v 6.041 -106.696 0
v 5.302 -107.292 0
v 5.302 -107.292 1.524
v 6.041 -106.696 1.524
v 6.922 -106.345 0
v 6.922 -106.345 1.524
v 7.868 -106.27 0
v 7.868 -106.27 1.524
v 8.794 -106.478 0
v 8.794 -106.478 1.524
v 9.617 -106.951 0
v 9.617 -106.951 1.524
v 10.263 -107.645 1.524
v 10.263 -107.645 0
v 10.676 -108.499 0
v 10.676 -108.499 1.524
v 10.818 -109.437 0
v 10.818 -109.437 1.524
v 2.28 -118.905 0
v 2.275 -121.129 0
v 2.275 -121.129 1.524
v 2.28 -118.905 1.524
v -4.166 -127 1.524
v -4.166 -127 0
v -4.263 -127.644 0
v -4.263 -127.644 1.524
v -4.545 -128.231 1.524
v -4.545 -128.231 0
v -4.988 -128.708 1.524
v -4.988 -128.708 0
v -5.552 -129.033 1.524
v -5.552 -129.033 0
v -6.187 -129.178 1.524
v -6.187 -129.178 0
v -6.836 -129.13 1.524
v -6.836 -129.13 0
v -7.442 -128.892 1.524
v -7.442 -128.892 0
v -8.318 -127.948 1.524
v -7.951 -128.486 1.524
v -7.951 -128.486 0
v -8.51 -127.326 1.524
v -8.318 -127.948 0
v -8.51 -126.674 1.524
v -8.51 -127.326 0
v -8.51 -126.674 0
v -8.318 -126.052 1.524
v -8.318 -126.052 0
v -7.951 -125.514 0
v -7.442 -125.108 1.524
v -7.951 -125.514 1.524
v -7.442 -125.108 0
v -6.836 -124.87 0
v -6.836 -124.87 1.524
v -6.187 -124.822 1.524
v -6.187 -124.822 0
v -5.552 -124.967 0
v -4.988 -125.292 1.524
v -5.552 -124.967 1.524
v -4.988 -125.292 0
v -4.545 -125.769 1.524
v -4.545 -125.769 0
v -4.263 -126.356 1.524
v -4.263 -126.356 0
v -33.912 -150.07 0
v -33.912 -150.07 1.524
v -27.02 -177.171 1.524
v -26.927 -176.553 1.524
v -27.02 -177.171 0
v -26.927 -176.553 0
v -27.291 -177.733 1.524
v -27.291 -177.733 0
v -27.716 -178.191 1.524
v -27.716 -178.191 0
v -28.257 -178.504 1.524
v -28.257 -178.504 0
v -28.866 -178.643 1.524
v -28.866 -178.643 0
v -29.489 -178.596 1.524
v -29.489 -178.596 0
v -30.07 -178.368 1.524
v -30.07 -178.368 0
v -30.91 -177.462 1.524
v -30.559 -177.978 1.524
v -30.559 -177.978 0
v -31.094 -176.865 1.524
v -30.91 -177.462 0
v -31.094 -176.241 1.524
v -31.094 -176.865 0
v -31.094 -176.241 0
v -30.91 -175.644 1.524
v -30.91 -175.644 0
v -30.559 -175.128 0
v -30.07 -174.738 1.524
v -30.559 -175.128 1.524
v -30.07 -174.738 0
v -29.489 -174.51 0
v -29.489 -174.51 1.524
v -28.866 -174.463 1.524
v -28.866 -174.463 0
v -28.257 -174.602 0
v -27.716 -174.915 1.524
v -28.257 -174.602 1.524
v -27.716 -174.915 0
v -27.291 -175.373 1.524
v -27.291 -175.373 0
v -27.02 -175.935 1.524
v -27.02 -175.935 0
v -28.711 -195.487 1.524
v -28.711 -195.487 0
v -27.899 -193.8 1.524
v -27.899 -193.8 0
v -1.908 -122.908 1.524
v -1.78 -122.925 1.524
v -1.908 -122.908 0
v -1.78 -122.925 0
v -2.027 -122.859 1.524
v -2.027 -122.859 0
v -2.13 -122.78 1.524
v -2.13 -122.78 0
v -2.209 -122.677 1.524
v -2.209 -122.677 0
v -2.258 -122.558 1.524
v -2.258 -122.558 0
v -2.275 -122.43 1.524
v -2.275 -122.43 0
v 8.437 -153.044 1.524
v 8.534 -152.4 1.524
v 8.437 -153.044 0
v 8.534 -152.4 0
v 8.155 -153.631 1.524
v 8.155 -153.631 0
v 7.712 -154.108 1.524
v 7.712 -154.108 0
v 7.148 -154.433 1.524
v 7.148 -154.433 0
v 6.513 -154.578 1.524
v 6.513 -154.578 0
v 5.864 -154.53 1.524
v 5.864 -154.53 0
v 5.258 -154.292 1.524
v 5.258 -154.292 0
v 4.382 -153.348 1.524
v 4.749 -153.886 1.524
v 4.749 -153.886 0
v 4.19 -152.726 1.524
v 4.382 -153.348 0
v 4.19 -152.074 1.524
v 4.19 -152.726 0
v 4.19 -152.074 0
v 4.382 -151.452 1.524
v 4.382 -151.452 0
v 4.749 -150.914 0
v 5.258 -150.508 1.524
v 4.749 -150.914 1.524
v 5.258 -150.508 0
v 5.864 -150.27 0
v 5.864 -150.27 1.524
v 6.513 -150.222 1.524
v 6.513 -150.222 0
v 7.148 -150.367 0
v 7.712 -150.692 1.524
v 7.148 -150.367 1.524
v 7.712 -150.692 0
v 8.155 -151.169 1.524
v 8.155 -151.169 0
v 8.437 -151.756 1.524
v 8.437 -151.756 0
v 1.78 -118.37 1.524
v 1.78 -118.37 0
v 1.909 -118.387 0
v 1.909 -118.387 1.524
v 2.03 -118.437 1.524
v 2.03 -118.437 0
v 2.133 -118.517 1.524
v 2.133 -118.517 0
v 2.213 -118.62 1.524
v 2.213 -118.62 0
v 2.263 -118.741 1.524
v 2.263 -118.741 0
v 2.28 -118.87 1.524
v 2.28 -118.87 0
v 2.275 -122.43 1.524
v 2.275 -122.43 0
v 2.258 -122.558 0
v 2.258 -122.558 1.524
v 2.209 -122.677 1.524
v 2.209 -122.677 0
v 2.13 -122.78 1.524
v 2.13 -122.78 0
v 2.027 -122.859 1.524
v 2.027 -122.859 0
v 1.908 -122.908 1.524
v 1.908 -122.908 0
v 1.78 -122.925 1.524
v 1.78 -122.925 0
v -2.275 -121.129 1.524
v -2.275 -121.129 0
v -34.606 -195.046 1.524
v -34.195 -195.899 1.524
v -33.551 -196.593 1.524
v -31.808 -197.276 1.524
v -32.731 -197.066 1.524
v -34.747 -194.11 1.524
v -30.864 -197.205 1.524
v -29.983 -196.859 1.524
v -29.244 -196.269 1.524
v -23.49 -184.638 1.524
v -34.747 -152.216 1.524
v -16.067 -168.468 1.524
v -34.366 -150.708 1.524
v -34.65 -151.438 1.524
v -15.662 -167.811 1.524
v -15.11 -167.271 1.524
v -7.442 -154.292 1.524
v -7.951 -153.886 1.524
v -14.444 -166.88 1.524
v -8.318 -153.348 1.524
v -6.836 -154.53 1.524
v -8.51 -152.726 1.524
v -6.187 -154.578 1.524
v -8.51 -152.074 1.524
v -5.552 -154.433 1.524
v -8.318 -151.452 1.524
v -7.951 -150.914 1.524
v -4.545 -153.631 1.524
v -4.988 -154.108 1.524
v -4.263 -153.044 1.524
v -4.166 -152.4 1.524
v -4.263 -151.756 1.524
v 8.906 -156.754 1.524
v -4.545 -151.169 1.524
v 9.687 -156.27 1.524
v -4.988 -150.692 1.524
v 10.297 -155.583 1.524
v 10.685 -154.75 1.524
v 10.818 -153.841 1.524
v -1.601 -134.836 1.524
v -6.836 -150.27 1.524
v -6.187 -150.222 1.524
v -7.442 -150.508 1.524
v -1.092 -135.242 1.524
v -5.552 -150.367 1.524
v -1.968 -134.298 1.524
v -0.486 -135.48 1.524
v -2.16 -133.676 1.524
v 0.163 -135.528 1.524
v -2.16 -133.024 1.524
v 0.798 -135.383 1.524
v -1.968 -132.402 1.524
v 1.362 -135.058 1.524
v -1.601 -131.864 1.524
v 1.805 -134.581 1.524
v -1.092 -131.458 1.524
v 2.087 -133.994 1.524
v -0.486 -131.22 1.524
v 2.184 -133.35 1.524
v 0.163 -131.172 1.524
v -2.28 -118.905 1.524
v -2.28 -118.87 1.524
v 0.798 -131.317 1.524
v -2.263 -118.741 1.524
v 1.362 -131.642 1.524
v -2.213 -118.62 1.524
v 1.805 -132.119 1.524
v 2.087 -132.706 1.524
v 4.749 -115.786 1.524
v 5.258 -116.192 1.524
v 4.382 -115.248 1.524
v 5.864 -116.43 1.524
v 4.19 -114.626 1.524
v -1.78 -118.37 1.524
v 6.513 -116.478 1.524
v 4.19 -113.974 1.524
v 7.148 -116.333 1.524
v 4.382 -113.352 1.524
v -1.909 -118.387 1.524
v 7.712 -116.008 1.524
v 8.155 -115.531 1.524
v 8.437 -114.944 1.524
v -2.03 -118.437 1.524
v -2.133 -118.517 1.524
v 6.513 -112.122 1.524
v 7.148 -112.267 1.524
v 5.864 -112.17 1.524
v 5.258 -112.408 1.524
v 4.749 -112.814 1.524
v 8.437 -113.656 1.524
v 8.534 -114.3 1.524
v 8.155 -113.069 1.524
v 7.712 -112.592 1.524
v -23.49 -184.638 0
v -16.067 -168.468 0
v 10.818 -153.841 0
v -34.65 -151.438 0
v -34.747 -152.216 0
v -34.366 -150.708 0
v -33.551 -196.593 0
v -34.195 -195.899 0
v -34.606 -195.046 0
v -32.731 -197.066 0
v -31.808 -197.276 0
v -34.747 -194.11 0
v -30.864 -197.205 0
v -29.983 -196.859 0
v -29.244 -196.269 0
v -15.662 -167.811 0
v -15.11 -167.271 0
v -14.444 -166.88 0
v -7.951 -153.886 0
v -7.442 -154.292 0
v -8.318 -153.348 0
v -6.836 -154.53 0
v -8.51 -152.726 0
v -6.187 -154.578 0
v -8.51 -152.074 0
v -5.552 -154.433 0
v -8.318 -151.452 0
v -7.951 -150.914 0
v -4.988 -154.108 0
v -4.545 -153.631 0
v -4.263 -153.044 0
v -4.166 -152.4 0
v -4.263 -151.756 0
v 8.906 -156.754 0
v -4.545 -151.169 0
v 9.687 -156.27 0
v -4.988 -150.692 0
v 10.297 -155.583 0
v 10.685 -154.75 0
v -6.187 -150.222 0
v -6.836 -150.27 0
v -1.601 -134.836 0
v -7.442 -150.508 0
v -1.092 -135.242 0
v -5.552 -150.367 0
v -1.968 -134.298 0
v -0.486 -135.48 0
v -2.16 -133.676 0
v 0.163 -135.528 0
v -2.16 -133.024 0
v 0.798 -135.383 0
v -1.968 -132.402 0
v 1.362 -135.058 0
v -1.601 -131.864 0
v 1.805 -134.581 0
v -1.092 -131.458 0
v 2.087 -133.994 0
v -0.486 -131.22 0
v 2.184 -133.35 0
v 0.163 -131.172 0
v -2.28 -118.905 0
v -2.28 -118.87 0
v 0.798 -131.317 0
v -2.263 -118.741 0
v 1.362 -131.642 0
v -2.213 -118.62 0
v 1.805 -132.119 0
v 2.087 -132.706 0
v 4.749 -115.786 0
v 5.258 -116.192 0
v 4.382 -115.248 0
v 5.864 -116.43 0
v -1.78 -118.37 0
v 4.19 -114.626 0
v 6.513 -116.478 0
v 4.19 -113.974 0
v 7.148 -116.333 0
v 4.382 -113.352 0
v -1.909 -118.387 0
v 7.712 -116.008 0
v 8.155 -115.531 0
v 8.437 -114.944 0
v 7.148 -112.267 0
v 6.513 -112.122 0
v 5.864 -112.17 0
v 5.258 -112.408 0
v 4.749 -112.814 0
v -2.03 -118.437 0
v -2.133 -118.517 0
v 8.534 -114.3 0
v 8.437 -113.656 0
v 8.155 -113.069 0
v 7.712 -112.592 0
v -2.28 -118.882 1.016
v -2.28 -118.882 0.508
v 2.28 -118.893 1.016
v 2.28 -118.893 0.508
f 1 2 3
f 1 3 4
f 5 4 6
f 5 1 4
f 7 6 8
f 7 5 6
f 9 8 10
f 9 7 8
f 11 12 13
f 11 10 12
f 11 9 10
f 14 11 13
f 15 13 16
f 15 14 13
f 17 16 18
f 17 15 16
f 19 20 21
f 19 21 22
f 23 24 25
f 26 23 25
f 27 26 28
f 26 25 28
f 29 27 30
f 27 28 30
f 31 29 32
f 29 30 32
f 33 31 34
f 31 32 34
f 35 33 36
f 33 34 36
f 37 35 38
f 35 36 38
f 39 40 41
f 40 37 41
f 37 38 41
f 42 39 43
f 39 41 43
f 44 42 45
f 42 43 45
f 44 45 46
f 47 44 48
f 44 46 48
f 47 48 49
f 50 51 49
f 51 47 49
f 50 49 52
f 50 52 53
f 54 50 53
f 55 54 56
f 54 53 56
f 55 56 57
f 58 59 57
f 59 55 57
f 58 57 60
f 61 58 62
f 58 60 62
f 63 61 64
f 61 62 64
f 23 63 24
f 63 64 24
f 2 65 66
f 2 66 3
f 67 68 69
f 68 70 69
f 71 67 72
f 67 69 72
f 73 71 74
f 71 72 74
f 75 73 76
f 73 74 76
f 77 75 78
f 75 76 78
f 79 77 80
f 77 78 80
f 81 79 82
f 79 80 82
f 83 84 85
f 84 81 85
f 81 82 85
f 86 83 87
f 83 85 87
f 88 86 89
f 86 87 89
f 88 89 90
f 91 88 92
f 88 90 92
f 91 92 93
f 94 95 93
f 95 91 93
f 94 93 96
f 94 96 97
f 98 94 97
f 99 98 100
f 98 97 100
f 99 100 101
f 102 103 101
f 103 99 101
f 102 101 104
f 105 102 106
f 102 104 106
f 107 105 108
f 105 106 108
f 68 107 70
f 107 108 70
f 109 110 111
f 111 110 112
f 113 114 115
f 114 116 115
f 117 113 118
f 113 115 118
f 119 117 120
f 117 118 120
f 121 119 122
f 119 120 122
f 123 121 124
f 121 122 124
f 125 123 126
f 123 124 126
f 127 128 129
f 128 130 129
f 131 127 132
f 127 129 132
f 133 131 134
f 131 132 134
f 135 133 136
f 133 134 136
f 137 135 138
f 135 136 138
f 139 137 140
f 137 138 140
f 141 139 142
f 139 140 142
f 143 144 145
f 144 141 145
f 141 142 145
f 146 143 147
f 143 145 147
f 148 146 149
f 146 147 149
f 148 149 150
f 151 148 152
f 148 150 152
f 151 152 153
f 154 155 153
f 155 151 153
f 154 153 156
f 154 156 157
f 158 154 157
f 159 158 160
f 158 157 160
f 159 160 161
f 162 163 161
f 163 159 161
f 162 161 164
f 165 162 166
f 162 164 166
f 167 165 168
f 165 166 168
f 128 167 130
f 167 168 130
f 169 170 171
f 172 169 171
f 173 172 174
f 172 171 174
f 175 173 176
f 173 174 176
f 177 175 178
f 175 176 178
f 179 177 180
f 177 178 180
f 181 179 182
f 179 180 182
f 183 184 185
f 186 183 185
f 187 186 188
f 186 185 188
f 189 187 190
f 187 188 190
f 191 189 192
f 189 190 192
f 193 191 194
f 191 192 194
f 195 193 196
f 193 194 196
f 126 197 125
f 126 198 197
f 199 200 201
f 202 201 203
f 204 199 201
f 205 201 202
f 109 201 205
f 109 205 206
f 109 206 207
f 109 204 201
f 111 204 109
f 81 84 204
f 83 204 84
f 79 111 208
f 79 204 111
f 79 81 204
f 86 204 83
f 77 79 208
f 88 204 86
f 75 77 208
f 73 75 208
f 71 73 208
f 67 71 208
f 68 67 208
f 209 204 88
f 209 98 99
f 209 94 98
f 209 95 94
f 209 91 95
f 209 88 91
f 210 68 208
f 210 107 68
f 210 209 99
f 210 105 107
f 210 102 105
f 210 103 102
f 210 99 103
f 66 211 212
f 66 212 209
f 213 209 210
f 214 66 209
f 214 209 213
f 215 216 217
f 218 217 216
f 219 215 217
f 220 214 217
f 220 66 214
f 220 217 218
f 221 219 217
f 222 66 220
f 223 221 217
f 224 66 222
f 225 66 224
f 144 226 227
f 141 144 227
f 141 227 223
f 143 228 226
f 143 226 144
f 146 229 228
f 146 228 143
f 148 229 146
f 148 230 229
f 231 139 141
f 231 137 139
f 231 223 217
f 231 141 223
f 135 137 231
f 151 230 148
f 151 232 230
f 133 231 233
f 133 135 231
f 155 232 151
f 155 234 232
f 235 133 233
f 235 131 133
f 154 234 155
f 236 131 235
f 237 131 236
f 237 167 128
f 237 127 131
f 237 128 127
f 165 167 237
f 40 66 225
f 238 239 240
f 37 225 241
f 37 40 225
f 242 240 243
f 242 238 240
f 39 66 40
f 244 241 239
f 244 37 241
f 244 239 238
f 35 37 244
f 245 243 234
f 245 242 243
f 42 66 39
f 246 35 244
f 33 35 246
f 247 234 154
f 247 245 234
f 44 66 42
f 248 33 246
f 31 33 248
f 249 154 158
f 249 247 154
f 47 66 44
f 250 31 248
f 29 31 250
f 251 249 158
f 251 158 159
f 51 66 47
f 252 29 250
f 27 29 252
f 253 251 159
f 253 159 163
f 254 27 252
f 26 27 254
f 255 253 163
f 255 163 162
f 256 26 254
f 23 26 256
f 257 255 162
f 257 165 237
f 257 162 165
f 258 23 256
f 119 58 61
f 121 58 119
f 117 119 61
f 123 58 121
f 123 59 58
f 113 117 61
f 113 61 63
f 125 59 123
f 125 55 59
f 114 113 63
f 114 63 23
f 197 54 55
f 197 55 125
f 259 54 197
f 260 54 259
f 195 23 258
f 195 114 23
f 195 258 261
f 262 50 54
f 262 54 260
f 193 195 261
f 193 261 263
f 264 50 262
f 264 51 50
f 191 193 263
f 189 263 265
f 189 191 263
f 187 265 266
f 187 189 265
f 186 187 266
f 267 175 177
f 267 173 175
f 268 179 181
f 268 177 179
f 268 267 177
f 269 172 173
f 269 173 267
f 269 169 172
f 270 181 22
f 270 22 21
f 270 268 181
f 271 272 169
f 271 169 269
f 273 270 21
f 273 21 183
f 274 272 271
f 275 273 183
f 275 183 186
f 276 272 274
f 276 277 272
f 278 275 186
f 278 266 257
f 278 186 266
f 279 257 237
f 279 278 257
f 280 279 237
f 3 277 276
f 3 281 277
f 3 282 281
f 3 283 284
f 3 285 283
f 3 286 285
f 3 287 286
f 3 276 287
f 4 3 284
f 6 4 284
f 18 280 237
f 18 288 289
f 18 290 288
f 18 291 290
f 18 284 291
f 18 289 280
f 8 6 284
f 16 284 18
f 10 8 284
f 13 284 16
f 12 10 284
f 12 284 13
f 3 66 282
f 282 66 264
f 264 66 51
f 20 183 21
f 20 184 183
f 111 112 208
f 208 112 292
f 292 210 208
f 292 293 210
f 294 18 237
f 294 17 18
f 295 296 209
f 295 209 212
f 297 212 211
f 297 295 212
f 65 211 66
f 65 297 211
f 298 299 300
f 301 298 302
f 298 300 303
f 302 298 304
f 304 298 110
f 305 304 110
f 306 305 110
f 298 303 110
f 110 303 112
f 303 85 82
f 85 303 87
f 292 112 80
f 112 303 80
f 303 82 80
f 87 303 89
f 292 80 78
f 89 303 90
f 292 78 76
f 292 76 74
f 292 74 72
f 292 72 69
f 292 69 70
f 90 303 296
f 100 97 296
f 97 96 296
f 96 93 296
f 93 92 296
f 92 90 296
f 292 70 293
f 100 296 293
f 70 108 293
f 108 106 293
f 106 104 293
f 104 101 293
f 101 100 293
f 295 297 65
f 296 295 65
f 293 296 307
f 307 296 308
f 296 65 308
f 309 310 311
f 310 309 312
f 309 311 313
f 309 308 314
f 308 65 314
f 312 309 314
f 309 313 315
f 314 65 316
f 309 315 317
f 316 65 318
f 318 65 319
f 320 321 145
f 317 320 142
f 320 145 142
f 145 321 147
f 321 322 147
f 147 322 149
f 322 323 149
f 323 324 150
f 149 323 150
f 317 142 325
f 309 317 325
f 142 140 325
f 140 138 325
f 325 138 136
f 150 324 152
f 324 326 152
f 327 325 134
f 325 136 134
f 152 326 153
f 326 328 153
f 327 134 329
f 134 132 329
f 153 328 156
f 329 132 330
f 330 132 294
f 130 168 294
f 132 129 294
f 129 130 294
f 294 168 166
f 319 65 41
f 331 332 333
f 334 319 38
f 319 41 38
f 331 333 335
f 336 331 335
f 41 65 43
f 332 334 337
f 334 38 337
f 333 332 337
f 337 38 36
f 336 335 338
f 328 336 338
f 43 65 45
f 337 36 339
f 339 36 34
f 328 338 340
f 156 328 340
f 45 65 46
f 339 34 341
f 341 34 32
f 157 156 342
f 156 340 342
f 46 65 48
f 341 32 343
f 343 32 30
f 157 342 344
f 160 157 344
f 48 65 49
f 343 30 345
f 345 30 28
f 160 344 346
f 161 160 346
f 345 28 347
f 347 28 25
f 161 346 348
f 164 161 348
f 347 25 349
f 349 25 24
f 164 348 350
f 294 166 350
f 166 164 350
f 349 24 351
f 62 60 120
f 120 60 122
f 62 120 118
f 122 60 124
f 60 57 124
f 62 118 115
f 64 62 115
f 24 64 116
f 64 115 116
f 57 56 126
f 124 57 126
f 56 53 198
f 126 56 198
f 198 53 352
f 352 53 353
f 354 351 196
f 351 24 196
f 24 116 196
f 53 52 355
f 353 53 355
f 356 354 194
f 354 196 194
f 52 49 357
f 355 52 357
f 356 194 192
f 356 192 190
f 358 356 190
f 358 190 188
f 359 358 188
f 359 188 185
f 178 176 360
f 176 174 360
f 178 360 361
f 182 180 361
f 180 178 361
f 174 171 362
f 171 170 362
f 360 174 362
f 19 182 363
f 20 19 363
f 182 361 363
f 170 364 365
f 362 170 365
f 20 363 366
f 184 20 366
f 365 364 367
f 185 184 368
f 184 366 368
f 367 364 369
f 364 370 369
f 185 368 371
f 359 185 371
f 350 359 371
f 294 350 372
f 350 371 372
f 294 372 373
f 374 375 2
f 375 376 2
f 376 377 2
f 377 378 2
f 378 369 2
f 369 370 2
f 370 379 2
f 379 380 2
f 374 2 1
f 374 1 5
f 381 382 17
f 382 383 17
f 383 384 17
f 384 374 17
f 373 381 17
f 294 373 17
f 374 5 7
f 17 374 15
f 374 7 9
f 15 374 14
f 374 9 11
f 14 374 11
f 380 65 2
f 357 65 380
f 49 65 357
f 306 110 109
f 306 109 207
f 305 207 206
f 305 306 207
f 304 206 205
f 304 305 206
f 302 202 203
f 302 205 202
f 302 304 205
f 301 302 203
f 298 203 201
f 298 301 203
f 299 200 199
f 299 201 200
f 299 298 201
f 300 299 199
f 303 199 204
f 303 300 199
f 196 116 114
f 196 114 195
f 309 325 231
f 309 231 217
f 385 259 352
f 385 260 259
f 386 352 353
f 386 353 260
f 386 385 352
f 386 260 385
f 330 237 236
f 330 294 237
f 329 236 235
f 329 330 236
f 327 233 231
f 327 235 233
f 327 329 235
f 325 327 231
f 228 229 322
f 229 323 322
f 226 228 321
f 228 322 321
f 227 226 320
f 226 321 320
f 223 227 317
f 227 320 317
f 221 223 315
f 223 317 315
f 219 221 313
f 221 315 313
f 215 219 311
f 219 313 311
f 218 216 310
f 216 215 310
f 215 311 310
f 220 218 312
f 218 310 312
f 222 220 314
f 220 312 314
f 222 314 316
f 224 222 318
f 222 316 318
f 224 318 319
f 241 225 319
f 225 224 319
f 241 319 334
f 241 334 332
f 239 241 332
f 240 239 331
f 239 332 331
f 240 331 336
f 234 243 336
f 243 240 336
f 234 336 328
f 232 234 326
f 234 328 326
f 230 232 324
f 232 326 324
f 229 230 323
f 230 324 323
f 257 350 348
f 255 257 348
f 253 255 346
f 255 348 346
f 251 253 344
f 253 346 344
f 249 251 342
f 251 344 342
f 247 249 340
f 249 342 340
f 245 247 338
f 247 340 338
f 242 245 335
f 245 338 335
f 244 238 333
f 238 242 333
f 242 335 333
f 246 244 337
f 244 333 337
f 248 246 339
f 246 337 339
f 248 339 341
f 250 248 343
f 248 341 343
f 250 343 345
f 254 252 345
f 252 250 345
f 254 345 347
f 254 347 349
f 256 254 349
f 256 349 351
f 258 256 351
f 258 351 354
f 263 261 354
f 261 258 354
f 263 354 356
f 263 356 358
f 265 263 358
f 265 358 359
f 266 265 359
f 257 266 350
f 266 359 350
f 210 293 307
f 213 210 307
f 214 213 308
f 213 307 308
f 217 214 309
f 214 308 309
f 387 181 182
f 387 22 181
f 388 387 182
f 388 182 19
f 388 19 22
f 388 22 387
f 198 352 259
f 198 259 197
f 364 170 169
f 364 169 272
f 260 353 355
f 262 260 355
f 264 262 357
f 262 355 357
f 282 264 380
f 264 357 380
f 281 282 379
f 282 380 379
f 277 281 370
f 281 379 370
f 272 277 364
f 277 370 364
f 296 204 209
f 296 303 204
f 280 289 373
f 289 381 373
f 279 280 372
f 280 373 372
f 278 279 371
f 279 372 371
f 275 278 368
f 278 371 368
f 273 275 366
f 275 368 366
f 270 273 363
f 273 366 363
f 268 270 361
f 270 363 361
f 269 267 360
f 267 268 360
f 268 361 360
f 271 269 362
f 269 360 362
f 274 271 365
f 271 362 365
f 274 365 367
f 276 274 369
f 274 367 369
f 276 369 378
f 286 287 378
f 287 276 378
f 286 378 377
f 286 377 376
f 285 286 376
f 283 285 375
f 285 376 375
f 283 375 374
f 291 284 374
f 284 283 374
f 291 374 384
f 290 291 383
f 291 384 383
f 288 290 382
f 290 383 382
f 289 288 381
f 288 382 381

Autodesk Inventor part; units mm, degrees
ref_plane "YZ Plane" through (0, 0, 0) normal (1, 0, 0) x (0, 1, 0)
ref_plane "XZ Plane" through (0, 0, 0) normal (0, 1, 0) x (-1, 0, 0)
ref_plane "XY Plane" through (0, 0, 0) normal (0, 0, 1) x (1, 0, 0)
sketch "Sketch1" plane through (0, 0, 0) normal (0, 0, 1) x (1, 0, 0)
  line L0 (-27.7783, -197.0642) -> (-31.3026, -204.3884) projected
  line L1 (-31.4232, -201.1242) -> (-27.8989, -193.8)
  line L2 (-27.8989, -193.8) -> (-23.4904, -184.6379)
  line L3 (-23.4904, -184.6379) -> (-28.7106, -195.4868)
  line L4 (-34.7466, -194.1101) -> (-34.7466, -152.2155)
  line L5 (-33.912, -150.07) -> (5.3023, -107.292)
  line L6 (10.8178, -109.4374) -> (10.8178, -153.8408)
  line L7 (8.906, -156.7537) -> (-14.4444, -166.8799)
  line L8 (-16.0666, -168.4681) -> (-23.4904, -184.6379)
  arc A0 (10.8178, -109.4374) -> (5.3023, -107.292) centre (7.6428, -109.4374) ccw
  arc A1 (8.906, -156.7537) -> (10.8178, -153.8408) centre (7.6428, -153.8408) ccw
  arc A2 (-14.4444, -166.8799) -> (-16.0666, -168.4681) centre (-13.1812, -169.7928) ccw
  arc A3 (-34.7466, -194.1101) -> (-28.7106, -195.4868) centre (-31.5716, -194.1101) ccw
  arc A4 (-33.912, -150.07) -> (-34.7466, -152.2155) centre (-31.5716, -152.2155) ccw
  circle A5 centre (6.35, -152.4) radius 2.1844 projected
  circle A6 centre (-6.35, -152.4) radius 2.1844 projected
  circle A7 centre (6.35, -114.3) radius 2.1844 projected
  circle A8 centre (-6.35, -127) radius 2.1844 projected
  circle A9 centre (-29.0224, -176.553) radius 2.0955
  line L9 (2.2749, -122.43) -> (2.2749, -121.1289) projected
  spline S0 degree 3 poles (2.2749, -121.1289) (2.2749, -120.7564) (2.2756, -120.3847) (2.2775, -119.644) (2.2787, -119.2745) (2.2799, -118.9051) knots 0 0 0 0 0.001117 0.001117 0.002234 0.002234 0.002234 0.002234 projected
  arc A10 (1.78, -122.9249) -> (2.2749, -122.43) centre (1.78, -122.43) ccw projected
  arc A11 (2.2799, -118.87) -> (1.78, -118.3701) centre (1.78, -118.87) ccw projected
  spline S1 degree 3 poles (2.2799, -118.9051) (2.2799, -118.8934) (2.2799, -118.8817) (2.2799, -118.87) knots 0 0 0 0 0.000035 0.000035 0.000035 0.000035 projected
  line L10 (1.78, -118.3701) -> (-1.78, -118.3701) projected
  arc A12 (-1.78, -118.3701) -> (-2.2799, -118.87) centre (-1.78, -118.87) ccw projected
  spline S2 degree 3 poles (-2.2799, -118.9051) (-2.2787, -119.2745) (-2.2775, -119.644) (-2.2756, -120.3847) (-2.2749, -120.7564) (-2.2749, -121.1289) knots 0.000013 0.000013 0.000013 0.000013 0.001129 0.001129 0.002246 0.002246 0.002246 0.002246 projected
  spline S3 degree 3 poles (-2.2799, -118.87) (-2.2799, -118.8817) (-2.2799, -118.8934) (-2.2799, -118.9051) knots 0 0 0 0 0.000035 0.000035 0.000035 0.000035 projected
  line L11 (-2.2749, -121.1289) -> (-2.2749, -122.43) projected
  arc A13 (-2.2749, -122.43) -> (-1.78, -122.9249) centre (-1.78, -122.43) ccw projected
  line L12 (-1.78, -122.9249) -> (1.78, -122.9249) projected
  circle A14 centre (0, -133.35) radius 2.1844
  point P0 (0, 0)
  point P1 (-34.7466, -208.031)
  dimension "d0" = 1.524
  dimension "d1" = 3.175
  dimension "d2" = 4.191
extrude "Extrusion1" add sketch "Sketch1" along normal blind 1.524
properties part number "back-sled"
